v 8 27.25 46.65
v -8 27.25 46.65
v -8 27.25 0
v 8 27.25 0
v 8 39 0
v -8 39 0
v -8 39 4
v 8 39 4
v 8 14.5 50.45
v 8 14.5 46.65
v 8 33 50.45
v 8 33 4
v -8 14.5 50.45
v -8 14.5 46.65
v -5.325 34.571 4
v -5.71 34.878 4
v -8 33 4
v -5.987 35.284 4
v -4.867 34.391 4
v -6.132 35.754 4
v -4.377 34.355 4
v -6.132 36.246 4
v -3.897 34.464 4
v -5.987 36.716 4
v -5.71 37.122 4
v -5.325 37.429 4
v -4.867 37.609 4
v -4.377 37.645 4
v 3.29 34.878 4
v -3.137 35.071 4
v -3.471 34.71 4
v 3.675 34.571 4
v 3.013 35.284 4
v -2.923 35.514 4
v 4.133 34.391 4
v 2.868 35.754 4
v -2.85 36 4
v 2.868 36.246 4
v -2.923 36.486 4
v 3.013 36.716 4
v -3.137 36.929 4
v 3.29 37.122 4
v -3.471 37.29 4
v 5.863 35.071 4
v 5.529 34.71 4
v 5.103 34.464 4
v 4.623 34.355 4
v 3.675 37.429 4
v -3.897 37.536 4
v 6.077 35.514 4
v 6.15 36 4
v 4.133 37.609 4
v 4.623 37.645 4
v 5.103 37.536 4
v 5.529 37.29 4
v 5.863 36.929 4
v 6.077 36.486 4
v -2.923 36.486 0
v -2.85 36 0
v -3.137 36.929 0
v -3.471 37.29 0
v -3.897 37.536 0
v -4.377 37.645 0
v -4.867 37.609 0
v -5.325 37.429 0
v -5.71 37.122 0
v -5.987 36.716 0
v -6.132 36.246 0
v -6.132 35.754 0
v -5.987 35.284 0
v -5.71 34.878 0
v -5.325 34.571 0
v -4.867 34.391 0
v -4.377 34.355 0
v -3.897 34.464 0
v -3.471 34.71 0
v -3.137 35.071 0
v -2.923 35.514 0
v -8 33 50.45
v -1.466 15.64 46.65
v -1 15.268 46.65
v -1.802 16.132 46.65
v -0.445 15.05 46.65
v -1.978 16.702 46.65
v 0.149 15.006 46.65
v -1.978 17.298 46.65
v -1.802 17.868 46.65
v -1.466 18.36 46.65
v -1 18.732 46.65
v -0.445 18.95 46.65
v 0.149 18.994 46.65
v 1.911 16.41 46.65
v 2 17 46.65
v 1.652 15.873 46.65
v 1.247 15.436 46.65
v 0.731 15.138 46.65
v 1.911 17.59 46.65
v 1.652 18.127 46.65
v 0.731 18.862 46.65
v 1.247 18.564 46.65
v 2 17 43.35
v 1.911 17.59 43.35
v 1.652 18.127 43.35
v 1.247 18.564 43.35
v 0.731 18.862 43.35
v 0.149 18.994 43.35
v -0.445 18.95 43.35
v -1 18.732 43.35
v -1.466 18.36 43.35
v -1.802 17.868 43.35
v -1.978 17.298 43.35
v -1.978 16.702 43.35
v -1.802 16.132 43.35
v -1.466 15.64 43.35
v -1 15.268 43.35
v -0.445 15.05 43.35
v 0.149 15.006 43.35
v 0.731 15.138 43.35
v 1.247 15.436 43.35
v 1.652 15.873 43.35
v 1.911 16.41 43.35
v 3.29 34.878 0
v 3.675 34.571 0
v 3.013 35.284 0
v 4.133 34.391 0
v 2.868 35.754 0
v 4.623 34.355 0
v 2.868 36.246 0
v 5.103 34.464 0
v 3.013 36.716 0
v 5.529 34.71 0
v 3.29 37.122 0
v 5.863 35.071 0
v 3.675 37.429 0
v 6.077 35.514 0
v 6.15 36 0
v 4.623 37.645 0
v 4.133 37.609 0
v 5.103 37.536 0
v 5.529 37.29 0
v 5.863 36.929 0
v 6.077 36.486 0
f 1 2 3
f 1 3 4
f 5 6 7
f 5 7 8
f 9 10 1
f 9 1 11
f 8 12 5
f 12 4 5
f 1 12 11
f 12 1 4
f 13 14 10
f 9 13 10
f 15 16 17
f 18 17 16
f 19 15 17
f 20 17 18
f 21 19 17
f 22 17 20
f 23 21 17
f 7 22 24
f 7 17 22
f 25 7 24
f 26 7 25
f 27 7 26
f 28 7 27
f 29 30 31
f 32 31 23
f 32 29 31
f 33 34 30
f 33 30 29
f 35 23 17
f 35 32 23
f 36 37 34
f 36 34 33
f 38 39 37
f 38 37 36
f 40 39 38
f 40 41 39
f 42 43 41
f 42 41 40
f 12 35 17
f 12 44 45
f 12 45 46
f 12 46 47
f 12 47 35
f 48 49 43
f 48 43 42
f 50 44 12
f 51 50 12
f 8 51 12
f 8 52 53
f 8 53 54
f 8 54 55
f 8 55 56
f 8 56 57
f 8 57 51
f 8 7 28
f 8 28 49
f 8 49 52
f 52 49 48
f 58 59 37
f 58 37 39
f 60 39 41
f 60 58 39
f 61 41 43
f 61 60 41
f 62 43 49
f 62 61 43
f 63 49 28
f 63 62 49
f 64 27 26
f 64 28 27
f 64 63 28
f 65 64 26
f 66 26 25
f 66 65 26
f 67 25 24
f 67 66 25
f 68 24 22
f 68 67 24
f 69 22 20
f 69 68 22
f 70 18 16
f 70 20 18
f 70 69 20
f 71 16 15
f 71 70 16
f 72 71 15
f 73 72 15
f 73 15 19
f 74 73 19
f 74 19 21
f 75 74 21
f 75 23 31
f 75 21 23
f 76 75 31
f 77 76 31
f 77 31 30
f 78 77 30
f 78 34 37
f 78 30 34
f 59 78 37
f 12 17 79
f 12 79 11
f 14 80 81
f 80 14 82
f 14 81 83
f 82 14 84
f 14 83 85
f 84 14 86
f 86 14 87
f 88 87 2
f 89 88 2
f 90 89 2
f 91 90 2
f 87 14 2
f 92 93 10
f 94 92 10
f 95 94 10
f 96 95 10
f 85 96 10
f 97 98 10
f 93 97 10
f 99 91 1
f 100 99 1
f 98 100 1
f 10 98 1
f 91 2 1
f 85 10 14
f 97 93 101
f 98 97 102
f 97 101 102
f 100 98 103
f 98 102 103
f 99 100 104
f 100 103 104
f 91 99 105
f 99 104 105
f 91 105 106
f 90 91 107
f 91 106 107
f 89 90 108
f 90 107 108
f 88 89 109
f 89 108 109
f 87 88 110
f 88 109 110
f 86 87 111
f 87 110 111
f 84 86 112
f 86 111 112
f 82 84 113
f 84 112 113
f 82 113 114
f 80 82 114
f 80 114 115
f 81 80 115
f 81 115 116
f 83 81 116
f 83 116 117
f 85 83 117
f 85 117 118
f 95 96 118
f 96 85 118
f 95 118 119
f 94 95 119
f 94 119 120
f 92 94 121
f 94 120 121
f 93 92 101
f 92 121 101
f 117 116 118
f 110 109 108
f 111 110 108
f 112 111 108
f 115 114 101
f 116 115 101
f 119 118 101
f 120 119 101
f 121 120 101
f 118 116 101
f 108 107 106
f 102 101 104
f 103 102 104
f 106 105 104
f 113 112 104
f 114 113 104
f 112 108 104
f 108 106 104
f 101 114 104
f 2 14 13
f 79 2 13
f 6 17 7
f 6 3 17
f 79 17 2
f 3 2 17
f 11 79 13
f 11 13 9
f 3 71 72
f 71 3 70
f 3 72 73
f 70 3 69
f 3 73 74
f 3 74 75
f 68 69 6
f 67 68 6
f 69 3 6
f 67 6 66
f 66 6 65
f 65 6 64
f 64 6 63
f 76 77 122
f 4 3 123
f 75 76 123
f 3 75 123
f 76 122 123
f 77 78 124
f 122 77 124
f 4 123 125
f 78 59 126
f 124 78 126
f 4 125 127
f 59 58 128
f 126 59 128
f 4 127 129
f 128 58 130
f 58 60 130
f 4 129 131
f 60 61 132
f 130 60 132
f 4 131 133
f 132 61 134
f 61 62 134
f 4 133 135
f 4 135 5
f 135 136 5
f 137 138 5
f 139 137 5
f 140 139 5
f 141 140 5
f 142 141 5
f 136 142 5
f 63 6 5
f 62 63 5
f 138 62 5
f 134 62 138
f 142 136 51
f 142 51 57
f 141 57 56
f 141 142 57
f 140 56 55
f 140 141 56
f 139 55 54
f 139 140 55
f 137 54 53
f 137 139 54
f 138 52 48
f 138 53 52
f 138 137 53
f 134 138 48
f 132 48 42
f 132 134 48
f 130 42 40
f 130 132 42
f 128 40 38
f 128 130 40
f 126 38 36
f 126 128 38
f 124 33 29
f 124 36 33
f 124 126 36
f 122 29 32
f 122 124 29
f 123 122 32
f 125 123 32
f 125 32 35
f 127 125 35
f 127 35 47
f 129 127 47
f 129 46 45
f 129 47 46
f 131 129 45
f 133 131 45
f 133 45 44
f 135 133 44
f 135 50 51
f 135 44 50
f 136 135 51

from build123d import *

# Parameters (mm, degrees)
BRACKET_FOOT_PROFILE_W                    = 16
BRACKET_FOOT_PROFILE_H                    = 11.75
BRACKET_FOOT_DEPTH                        = 4
UPRIGHT_START                             = 4
UPRIGHT_PROFILE_W                         = 16
UPRIGHT_PROFILE_H                         = 5.75
UPRIGHT_DEPTH                             = 46.45
UPPER_START                               = 46.65
UPPER_ARM_PROFILE_W                       = 16
UPPER_ARM_PROFILE_H                       = 13.2
UPPER_ARM_DEPTH                           = 3.8
BRACKET_START                             = -0.1
BRACKET_BOLT_CLEARANCES_PROFILE_R         = 1.65
BRACKET_BOLT_CLEARANCES_DEPTH             = 4.2
INTEGRAL_START                            = 43.35
INTEGRAL_STOP_PIN_DIAMETER_4_MM_PROFILE_R = 2
INTEGRAL_STOP_PIN_DIAMETER_4_MM_DEPTH     = 3.5


with BuildPart() as part:
    # Bracket foot profile → Bracket foot (new body)
    with BuildSketch(Plane.XY):
        with Locations((0, 33.125)):
            Rectangle(BRACKET_FOOT_PROFILE_W, BRACKET_FOOT_PROFILE_H)
    extrude(amount=BRACKET_FOOT_DEPTH)

    # Upright profile → Upright (add)
    with BuildSketch(Plane.XY.offset(UPRIGHT_START)):
        with Locations((0, 30.125)):
            Rectangle(UPRIGHT_PROFILE_W, UPRIGHT_PROFILE_H)
    extrude(amount=UPRIGHT_DEPTH)

    # Upper arm profile → Upper arm (add)
    with BuildSketch(Plane.XY.offset(UPPER_START)):
        with Locations((0, 21.1)):
            Rectangle(UPPER_ARM_PROFILE_W, UPPER_ARM_PROFILE_H)
    extrude(amount=UPPER_ARM_DEPTH)

    # Bracket bolt clearances profile → Bracket bolt clearances (cut)
    with BuildSketch(Plane.XY.offset(BRACKET_START)):
        with Locations((-4.5, 36)):
            Circle(BRACKET_BOLT_CLEARANCES_PROFILE_R)
        with Locations((4.5, 36)):
            Circle(BRACKET_BOLT_CLEARANCES_PROFILE_R)
    extrude(amount=BRACKET_BOLT_CLEARANCES_DEPTH, mode=Mode.SUBTRACT)

    # Integral stop pin diameter 4 mm profile → Integral stop pin diameter 4 mm (add)
    with BuildSketch(Plane.XY.offset(INTEGRAL_START)):
        with Locations((0, 17)):
            Circle(INTEGRAL_STOP_PIN_DIAMETER_4_MM_PROFILE_R)
    extrude(amount=INTEGRAL_STOP_PIN_DIAMETER_4_MM_DEPTH)


solid = part.part
